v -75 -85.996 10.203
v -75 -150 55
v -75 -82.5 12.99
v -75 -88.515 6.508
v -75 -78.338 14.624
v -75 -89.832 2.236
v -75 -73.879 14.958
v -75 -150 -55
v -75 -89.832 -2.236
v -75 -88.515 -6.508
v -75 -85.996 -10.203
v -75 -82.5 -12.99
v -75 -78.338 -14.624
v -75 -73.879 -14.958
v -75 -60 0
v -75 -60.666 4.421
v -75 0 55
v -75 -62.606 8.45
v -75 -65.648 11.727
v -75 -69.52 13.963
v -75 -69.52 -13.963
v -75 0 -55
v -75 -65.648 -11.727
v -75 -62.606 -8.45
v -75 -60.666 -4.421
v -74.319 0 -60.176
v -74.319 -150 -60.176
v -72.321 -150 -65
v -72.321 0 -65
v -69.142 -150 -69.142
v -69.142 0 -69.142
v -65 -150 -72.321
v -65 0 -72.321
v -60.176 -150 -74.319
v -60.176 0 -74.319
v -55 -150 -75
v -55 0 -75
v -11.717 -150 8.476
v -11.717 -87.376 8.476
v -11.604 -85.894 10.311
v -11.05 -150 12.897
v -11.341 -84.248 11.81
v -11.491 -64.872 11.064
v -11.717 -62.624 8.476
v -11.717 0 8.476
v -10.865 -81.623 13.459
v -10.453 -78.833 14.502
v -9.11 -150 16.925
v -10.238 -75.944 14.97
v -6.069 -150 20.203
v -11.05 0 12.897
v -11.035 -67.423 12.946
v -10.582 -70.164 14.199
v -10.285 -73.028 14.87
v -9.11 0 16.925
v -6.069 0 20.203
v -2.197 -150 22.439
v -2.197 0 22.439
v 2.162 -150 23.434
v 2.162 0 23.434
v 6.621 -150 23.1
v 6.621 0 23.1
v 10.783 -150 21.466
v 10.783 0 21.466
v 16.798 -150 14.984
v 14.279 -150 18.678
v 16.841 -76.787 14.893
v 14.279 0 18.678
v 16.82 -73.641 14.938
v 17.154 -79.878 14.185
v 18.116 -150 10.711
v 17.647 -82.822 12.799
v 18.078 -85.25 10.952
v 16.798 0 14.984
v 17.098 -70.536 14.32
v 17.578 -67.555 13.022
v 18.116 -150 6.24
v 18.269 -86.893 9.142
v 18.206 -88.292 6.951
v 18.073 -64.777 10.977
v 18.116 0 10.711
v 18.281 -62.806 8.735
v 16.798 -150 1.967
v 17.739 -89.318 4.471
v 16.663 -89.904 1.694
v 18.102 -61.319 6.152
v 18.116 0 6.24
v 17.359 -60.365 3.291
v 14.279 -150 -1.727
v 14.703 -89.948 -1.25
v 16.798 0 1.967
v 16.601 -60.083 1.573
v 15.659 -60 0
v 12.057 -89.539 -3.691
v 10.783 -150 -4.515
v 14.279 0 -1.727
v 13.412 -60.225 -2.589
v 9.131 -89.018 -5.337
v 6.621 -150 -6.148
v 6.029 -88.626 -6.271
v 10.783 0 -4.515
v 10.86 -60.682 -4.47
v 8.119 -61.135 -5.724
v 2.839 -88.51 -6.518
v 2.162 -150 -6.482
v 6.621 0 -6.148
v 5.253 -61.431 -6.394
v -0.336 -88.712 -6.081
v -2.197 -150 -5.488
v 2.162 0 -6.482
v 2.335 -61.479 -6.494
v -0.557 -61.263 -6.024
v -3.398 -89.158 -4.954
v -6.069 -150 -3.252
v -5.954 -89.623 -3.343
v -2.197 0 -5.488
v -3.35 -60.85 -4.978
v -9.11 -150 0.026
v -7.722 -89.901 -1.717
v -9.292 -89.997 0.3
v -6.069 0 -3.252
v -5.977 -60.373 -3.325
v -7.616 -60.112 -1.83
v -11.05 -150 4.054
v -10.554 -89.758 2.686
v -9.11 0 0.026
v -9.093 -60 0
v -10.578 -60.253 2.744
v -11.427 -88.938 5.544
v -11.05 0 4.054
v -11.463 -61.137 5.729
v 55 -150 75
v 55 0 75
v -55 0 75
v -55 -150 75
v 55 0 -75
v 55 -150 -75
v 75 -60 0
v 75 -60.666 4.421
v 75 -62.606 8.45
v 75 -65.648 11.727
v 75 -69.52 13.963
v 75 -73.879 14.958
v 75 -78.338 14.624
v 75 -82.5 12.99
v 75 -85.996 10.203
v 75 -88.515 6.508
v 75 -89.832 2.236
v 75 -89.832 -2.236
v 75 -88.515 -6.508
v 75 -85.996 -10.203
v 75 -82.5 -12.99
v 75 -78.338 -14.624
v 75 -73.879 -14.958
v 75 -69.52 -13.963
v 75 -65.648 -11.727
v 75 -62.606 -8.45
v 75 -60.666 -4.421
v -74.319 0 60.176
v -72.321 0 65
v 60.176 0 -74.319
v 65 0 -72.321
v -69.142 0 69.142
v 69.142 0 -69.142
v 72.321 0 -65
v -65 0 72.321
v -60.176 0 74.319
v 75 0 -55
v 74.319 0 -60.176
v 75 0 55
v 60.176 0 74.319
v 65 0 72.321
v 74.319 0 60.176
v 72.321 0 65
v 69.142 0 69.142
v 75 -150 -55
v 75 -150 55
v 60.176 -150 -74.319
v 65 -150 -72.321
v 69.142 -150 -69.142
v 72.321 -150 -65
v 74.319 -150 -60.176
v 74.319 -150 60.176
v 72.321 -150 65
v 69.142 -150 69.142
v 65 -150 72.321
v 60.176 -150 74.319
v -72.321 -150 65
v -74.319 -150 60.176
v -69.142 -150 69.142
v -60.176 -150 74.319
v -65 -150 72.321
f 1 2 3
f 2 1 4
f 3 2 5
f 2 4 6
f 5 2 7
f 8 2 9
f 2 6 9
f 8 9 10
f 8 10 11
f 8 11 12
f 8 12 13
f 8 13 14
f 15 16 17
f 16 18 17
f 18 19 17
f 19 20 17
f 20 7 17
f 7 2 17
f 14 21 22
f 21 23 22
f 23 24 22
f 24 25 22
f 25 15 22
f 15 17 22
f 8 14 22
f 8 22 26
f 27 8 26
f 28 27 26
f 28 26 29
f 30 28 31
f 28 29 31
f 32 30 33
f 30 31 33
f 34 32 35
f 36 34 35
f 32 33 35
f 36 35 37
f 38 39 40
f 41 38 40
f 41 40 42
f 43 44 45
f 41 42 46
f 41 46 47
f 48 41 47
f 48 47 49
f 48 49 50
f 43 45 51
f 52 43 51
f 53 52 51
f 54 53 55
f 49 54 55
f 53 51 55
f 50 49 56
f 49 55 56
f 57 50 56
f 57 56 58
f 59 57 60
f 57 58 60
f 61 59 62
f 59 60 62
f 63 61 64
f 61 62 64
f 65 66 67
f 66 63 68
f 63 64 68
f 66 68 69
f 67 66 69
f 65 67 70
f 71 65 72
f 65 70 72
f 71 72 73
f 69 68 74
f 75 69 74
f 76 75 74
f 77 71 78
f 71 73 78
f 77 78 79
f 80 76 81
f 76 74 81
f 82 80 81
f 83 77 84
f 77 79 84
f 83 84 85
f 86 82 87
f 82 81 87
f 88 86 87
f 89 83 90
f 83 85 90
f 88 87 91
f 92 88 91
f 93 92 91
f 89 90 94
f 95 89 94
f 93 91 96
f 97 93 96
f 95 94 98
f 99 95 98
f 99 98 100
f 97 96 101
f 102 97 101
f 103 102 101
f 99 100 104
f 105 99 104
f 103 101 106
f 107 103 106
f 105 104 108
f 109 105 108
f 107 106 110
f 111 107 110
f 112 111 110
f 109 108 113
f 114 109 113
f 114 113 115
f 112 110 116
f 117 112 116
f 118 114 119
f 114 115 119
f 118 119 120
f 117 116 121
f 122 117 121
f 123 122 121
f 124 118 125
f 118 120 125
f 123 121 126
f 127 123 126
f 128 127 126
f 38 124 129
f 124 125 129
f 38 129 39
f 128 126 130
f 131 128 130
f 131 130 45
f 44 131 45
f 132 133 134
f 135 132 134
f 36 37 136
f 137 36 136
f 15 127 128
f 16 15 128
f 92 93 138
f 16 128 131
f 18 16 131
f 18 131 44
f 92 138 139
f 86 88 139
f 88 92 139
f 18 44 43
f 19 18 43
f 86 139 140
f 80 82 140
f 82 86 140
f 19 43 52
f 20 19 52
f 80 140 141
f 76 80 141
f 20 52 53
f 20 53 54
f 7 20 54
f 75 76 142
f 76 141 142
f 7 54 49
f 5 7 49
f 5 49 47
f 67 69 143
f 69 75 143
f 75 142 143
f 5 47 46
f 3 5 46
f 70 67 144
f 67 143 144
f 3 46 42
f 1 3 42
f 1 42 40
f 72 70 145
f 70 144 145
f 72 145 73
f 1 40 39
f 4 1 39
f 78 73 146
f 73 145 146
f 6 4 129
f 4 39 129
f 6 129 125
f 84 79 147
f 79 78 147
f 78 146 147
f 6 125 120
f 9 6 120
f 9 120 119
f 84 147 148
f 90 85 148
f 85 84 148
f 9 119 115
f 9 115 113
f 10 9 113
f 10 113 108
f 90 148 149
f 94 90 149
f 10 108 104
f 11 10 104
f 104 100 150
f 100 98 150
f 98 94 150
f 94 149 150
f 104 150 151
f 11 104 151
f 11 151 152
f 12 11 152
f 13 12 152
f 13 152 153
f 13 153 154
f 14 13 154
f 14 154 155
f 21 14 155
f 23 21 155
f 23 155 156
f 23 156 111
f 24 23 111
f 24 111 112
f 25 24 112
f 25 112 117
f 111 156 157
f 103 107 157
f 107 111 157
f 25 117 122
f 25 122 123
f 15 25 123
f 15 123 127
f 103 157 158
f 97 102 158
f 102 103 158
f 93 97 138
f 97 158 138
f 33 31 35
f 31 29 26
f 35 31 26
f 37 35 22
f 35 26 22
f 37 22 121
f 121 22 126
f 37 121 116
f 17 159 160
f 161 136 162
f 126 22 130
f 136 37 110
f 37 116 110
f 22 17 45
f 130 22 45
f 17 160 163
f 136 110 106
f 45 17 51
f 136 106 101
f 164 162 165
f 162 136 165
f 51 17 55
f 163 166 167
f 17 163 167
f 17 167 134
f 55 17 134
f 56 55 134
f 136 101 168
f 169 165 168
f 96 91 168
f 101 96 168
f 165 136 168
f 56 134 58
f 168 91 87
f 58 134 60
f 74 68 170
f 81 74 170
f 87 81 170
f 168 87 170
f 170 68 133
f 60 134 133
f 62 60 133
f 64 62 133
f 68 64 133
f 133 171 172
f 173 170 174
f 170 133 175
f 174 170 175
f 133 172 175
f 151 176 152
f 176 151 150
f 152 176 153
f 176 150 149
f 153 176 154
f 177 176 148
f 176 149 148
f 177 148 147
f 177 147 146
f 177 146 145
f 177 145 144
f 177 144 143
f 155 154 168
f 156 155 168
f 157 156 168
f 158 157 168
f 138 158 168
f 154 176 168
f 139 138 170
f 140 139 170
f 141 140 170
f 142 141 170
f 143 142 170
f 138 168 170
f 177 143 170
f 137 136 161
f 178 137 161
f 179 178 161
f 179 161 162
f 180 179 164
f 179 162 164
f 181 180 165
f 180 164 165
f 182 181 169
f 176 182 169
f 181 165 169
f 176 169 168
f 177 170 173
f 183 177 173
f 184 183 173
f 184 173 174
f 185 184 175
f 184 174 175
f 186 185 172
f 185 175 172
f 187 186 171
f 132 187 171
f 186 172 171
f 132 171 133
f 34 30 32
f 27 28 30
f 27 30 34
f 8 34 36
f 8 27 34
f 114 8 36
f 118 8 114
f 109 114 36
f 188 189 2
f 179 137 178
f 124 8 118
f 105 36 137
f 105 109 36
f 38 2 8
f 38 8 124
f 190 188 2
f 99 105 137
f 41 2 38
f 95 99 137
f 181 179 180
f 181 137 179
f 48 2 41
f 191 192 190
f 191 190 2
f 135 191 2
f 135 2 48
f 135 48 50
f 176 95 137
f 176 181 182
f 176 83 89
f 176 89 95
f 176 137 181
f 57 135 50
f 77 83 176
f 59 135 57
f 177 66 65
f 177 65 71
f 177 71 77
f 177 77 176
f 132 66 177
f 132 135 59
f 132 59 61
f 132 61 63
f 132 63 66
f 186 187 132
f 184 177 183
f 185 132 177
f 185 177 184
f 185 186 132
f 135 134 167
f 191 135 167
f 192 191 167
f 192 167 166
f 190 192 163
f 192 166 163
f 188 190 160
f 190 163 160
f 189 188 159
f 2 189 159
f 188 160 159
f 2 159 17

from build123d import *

# Parameters (mm, degrees)
F1_DEPTH = 150
F3_D     = 30
F4_R     = 15
F5_DEPTH = 150


with BuildPart() as f1:
    # F0 (on Front) → F1 (new body)
    with BuildSketch(Plane.XZ):
        with BuildLine():
            ThreePointArc((75, 55), (69.142136, 69.142136), (55, 75))
            Line((55, 75), (-55, 75))
            ThreePointArc((-55, 75), (-69.142136, 69.142136), (-75, 55))
            Line((-75, 55), (-75, -55))
            ThreePointArc((-75, -55), (-69.142136, -69.142136), (-55, -75))
            Line((-55, -75), (55, -75))
            ThreePointArc((55, -75), (69.142136, -69.142136), (75, -55))
            Line((75, -55), (75, 55))
        make_face()
    extrude(amount=F1_DEPTH)

    # F3 (through all)
    with Locations(Plane.XZ.offset(150)):
        with Locations((3.283451, 8.47559)):
            Hole(F3_D / 2)

    # F4 (on face) → F5 (cut)
    with BuildSketch(Plane.YZ.offset(75)):
        with Locations((-75, 0)):
            Circle(F4_R)
    extrude(amount=-F5_DEPTH, mode=Mode.SUBTRACT)


solid = f1.part
